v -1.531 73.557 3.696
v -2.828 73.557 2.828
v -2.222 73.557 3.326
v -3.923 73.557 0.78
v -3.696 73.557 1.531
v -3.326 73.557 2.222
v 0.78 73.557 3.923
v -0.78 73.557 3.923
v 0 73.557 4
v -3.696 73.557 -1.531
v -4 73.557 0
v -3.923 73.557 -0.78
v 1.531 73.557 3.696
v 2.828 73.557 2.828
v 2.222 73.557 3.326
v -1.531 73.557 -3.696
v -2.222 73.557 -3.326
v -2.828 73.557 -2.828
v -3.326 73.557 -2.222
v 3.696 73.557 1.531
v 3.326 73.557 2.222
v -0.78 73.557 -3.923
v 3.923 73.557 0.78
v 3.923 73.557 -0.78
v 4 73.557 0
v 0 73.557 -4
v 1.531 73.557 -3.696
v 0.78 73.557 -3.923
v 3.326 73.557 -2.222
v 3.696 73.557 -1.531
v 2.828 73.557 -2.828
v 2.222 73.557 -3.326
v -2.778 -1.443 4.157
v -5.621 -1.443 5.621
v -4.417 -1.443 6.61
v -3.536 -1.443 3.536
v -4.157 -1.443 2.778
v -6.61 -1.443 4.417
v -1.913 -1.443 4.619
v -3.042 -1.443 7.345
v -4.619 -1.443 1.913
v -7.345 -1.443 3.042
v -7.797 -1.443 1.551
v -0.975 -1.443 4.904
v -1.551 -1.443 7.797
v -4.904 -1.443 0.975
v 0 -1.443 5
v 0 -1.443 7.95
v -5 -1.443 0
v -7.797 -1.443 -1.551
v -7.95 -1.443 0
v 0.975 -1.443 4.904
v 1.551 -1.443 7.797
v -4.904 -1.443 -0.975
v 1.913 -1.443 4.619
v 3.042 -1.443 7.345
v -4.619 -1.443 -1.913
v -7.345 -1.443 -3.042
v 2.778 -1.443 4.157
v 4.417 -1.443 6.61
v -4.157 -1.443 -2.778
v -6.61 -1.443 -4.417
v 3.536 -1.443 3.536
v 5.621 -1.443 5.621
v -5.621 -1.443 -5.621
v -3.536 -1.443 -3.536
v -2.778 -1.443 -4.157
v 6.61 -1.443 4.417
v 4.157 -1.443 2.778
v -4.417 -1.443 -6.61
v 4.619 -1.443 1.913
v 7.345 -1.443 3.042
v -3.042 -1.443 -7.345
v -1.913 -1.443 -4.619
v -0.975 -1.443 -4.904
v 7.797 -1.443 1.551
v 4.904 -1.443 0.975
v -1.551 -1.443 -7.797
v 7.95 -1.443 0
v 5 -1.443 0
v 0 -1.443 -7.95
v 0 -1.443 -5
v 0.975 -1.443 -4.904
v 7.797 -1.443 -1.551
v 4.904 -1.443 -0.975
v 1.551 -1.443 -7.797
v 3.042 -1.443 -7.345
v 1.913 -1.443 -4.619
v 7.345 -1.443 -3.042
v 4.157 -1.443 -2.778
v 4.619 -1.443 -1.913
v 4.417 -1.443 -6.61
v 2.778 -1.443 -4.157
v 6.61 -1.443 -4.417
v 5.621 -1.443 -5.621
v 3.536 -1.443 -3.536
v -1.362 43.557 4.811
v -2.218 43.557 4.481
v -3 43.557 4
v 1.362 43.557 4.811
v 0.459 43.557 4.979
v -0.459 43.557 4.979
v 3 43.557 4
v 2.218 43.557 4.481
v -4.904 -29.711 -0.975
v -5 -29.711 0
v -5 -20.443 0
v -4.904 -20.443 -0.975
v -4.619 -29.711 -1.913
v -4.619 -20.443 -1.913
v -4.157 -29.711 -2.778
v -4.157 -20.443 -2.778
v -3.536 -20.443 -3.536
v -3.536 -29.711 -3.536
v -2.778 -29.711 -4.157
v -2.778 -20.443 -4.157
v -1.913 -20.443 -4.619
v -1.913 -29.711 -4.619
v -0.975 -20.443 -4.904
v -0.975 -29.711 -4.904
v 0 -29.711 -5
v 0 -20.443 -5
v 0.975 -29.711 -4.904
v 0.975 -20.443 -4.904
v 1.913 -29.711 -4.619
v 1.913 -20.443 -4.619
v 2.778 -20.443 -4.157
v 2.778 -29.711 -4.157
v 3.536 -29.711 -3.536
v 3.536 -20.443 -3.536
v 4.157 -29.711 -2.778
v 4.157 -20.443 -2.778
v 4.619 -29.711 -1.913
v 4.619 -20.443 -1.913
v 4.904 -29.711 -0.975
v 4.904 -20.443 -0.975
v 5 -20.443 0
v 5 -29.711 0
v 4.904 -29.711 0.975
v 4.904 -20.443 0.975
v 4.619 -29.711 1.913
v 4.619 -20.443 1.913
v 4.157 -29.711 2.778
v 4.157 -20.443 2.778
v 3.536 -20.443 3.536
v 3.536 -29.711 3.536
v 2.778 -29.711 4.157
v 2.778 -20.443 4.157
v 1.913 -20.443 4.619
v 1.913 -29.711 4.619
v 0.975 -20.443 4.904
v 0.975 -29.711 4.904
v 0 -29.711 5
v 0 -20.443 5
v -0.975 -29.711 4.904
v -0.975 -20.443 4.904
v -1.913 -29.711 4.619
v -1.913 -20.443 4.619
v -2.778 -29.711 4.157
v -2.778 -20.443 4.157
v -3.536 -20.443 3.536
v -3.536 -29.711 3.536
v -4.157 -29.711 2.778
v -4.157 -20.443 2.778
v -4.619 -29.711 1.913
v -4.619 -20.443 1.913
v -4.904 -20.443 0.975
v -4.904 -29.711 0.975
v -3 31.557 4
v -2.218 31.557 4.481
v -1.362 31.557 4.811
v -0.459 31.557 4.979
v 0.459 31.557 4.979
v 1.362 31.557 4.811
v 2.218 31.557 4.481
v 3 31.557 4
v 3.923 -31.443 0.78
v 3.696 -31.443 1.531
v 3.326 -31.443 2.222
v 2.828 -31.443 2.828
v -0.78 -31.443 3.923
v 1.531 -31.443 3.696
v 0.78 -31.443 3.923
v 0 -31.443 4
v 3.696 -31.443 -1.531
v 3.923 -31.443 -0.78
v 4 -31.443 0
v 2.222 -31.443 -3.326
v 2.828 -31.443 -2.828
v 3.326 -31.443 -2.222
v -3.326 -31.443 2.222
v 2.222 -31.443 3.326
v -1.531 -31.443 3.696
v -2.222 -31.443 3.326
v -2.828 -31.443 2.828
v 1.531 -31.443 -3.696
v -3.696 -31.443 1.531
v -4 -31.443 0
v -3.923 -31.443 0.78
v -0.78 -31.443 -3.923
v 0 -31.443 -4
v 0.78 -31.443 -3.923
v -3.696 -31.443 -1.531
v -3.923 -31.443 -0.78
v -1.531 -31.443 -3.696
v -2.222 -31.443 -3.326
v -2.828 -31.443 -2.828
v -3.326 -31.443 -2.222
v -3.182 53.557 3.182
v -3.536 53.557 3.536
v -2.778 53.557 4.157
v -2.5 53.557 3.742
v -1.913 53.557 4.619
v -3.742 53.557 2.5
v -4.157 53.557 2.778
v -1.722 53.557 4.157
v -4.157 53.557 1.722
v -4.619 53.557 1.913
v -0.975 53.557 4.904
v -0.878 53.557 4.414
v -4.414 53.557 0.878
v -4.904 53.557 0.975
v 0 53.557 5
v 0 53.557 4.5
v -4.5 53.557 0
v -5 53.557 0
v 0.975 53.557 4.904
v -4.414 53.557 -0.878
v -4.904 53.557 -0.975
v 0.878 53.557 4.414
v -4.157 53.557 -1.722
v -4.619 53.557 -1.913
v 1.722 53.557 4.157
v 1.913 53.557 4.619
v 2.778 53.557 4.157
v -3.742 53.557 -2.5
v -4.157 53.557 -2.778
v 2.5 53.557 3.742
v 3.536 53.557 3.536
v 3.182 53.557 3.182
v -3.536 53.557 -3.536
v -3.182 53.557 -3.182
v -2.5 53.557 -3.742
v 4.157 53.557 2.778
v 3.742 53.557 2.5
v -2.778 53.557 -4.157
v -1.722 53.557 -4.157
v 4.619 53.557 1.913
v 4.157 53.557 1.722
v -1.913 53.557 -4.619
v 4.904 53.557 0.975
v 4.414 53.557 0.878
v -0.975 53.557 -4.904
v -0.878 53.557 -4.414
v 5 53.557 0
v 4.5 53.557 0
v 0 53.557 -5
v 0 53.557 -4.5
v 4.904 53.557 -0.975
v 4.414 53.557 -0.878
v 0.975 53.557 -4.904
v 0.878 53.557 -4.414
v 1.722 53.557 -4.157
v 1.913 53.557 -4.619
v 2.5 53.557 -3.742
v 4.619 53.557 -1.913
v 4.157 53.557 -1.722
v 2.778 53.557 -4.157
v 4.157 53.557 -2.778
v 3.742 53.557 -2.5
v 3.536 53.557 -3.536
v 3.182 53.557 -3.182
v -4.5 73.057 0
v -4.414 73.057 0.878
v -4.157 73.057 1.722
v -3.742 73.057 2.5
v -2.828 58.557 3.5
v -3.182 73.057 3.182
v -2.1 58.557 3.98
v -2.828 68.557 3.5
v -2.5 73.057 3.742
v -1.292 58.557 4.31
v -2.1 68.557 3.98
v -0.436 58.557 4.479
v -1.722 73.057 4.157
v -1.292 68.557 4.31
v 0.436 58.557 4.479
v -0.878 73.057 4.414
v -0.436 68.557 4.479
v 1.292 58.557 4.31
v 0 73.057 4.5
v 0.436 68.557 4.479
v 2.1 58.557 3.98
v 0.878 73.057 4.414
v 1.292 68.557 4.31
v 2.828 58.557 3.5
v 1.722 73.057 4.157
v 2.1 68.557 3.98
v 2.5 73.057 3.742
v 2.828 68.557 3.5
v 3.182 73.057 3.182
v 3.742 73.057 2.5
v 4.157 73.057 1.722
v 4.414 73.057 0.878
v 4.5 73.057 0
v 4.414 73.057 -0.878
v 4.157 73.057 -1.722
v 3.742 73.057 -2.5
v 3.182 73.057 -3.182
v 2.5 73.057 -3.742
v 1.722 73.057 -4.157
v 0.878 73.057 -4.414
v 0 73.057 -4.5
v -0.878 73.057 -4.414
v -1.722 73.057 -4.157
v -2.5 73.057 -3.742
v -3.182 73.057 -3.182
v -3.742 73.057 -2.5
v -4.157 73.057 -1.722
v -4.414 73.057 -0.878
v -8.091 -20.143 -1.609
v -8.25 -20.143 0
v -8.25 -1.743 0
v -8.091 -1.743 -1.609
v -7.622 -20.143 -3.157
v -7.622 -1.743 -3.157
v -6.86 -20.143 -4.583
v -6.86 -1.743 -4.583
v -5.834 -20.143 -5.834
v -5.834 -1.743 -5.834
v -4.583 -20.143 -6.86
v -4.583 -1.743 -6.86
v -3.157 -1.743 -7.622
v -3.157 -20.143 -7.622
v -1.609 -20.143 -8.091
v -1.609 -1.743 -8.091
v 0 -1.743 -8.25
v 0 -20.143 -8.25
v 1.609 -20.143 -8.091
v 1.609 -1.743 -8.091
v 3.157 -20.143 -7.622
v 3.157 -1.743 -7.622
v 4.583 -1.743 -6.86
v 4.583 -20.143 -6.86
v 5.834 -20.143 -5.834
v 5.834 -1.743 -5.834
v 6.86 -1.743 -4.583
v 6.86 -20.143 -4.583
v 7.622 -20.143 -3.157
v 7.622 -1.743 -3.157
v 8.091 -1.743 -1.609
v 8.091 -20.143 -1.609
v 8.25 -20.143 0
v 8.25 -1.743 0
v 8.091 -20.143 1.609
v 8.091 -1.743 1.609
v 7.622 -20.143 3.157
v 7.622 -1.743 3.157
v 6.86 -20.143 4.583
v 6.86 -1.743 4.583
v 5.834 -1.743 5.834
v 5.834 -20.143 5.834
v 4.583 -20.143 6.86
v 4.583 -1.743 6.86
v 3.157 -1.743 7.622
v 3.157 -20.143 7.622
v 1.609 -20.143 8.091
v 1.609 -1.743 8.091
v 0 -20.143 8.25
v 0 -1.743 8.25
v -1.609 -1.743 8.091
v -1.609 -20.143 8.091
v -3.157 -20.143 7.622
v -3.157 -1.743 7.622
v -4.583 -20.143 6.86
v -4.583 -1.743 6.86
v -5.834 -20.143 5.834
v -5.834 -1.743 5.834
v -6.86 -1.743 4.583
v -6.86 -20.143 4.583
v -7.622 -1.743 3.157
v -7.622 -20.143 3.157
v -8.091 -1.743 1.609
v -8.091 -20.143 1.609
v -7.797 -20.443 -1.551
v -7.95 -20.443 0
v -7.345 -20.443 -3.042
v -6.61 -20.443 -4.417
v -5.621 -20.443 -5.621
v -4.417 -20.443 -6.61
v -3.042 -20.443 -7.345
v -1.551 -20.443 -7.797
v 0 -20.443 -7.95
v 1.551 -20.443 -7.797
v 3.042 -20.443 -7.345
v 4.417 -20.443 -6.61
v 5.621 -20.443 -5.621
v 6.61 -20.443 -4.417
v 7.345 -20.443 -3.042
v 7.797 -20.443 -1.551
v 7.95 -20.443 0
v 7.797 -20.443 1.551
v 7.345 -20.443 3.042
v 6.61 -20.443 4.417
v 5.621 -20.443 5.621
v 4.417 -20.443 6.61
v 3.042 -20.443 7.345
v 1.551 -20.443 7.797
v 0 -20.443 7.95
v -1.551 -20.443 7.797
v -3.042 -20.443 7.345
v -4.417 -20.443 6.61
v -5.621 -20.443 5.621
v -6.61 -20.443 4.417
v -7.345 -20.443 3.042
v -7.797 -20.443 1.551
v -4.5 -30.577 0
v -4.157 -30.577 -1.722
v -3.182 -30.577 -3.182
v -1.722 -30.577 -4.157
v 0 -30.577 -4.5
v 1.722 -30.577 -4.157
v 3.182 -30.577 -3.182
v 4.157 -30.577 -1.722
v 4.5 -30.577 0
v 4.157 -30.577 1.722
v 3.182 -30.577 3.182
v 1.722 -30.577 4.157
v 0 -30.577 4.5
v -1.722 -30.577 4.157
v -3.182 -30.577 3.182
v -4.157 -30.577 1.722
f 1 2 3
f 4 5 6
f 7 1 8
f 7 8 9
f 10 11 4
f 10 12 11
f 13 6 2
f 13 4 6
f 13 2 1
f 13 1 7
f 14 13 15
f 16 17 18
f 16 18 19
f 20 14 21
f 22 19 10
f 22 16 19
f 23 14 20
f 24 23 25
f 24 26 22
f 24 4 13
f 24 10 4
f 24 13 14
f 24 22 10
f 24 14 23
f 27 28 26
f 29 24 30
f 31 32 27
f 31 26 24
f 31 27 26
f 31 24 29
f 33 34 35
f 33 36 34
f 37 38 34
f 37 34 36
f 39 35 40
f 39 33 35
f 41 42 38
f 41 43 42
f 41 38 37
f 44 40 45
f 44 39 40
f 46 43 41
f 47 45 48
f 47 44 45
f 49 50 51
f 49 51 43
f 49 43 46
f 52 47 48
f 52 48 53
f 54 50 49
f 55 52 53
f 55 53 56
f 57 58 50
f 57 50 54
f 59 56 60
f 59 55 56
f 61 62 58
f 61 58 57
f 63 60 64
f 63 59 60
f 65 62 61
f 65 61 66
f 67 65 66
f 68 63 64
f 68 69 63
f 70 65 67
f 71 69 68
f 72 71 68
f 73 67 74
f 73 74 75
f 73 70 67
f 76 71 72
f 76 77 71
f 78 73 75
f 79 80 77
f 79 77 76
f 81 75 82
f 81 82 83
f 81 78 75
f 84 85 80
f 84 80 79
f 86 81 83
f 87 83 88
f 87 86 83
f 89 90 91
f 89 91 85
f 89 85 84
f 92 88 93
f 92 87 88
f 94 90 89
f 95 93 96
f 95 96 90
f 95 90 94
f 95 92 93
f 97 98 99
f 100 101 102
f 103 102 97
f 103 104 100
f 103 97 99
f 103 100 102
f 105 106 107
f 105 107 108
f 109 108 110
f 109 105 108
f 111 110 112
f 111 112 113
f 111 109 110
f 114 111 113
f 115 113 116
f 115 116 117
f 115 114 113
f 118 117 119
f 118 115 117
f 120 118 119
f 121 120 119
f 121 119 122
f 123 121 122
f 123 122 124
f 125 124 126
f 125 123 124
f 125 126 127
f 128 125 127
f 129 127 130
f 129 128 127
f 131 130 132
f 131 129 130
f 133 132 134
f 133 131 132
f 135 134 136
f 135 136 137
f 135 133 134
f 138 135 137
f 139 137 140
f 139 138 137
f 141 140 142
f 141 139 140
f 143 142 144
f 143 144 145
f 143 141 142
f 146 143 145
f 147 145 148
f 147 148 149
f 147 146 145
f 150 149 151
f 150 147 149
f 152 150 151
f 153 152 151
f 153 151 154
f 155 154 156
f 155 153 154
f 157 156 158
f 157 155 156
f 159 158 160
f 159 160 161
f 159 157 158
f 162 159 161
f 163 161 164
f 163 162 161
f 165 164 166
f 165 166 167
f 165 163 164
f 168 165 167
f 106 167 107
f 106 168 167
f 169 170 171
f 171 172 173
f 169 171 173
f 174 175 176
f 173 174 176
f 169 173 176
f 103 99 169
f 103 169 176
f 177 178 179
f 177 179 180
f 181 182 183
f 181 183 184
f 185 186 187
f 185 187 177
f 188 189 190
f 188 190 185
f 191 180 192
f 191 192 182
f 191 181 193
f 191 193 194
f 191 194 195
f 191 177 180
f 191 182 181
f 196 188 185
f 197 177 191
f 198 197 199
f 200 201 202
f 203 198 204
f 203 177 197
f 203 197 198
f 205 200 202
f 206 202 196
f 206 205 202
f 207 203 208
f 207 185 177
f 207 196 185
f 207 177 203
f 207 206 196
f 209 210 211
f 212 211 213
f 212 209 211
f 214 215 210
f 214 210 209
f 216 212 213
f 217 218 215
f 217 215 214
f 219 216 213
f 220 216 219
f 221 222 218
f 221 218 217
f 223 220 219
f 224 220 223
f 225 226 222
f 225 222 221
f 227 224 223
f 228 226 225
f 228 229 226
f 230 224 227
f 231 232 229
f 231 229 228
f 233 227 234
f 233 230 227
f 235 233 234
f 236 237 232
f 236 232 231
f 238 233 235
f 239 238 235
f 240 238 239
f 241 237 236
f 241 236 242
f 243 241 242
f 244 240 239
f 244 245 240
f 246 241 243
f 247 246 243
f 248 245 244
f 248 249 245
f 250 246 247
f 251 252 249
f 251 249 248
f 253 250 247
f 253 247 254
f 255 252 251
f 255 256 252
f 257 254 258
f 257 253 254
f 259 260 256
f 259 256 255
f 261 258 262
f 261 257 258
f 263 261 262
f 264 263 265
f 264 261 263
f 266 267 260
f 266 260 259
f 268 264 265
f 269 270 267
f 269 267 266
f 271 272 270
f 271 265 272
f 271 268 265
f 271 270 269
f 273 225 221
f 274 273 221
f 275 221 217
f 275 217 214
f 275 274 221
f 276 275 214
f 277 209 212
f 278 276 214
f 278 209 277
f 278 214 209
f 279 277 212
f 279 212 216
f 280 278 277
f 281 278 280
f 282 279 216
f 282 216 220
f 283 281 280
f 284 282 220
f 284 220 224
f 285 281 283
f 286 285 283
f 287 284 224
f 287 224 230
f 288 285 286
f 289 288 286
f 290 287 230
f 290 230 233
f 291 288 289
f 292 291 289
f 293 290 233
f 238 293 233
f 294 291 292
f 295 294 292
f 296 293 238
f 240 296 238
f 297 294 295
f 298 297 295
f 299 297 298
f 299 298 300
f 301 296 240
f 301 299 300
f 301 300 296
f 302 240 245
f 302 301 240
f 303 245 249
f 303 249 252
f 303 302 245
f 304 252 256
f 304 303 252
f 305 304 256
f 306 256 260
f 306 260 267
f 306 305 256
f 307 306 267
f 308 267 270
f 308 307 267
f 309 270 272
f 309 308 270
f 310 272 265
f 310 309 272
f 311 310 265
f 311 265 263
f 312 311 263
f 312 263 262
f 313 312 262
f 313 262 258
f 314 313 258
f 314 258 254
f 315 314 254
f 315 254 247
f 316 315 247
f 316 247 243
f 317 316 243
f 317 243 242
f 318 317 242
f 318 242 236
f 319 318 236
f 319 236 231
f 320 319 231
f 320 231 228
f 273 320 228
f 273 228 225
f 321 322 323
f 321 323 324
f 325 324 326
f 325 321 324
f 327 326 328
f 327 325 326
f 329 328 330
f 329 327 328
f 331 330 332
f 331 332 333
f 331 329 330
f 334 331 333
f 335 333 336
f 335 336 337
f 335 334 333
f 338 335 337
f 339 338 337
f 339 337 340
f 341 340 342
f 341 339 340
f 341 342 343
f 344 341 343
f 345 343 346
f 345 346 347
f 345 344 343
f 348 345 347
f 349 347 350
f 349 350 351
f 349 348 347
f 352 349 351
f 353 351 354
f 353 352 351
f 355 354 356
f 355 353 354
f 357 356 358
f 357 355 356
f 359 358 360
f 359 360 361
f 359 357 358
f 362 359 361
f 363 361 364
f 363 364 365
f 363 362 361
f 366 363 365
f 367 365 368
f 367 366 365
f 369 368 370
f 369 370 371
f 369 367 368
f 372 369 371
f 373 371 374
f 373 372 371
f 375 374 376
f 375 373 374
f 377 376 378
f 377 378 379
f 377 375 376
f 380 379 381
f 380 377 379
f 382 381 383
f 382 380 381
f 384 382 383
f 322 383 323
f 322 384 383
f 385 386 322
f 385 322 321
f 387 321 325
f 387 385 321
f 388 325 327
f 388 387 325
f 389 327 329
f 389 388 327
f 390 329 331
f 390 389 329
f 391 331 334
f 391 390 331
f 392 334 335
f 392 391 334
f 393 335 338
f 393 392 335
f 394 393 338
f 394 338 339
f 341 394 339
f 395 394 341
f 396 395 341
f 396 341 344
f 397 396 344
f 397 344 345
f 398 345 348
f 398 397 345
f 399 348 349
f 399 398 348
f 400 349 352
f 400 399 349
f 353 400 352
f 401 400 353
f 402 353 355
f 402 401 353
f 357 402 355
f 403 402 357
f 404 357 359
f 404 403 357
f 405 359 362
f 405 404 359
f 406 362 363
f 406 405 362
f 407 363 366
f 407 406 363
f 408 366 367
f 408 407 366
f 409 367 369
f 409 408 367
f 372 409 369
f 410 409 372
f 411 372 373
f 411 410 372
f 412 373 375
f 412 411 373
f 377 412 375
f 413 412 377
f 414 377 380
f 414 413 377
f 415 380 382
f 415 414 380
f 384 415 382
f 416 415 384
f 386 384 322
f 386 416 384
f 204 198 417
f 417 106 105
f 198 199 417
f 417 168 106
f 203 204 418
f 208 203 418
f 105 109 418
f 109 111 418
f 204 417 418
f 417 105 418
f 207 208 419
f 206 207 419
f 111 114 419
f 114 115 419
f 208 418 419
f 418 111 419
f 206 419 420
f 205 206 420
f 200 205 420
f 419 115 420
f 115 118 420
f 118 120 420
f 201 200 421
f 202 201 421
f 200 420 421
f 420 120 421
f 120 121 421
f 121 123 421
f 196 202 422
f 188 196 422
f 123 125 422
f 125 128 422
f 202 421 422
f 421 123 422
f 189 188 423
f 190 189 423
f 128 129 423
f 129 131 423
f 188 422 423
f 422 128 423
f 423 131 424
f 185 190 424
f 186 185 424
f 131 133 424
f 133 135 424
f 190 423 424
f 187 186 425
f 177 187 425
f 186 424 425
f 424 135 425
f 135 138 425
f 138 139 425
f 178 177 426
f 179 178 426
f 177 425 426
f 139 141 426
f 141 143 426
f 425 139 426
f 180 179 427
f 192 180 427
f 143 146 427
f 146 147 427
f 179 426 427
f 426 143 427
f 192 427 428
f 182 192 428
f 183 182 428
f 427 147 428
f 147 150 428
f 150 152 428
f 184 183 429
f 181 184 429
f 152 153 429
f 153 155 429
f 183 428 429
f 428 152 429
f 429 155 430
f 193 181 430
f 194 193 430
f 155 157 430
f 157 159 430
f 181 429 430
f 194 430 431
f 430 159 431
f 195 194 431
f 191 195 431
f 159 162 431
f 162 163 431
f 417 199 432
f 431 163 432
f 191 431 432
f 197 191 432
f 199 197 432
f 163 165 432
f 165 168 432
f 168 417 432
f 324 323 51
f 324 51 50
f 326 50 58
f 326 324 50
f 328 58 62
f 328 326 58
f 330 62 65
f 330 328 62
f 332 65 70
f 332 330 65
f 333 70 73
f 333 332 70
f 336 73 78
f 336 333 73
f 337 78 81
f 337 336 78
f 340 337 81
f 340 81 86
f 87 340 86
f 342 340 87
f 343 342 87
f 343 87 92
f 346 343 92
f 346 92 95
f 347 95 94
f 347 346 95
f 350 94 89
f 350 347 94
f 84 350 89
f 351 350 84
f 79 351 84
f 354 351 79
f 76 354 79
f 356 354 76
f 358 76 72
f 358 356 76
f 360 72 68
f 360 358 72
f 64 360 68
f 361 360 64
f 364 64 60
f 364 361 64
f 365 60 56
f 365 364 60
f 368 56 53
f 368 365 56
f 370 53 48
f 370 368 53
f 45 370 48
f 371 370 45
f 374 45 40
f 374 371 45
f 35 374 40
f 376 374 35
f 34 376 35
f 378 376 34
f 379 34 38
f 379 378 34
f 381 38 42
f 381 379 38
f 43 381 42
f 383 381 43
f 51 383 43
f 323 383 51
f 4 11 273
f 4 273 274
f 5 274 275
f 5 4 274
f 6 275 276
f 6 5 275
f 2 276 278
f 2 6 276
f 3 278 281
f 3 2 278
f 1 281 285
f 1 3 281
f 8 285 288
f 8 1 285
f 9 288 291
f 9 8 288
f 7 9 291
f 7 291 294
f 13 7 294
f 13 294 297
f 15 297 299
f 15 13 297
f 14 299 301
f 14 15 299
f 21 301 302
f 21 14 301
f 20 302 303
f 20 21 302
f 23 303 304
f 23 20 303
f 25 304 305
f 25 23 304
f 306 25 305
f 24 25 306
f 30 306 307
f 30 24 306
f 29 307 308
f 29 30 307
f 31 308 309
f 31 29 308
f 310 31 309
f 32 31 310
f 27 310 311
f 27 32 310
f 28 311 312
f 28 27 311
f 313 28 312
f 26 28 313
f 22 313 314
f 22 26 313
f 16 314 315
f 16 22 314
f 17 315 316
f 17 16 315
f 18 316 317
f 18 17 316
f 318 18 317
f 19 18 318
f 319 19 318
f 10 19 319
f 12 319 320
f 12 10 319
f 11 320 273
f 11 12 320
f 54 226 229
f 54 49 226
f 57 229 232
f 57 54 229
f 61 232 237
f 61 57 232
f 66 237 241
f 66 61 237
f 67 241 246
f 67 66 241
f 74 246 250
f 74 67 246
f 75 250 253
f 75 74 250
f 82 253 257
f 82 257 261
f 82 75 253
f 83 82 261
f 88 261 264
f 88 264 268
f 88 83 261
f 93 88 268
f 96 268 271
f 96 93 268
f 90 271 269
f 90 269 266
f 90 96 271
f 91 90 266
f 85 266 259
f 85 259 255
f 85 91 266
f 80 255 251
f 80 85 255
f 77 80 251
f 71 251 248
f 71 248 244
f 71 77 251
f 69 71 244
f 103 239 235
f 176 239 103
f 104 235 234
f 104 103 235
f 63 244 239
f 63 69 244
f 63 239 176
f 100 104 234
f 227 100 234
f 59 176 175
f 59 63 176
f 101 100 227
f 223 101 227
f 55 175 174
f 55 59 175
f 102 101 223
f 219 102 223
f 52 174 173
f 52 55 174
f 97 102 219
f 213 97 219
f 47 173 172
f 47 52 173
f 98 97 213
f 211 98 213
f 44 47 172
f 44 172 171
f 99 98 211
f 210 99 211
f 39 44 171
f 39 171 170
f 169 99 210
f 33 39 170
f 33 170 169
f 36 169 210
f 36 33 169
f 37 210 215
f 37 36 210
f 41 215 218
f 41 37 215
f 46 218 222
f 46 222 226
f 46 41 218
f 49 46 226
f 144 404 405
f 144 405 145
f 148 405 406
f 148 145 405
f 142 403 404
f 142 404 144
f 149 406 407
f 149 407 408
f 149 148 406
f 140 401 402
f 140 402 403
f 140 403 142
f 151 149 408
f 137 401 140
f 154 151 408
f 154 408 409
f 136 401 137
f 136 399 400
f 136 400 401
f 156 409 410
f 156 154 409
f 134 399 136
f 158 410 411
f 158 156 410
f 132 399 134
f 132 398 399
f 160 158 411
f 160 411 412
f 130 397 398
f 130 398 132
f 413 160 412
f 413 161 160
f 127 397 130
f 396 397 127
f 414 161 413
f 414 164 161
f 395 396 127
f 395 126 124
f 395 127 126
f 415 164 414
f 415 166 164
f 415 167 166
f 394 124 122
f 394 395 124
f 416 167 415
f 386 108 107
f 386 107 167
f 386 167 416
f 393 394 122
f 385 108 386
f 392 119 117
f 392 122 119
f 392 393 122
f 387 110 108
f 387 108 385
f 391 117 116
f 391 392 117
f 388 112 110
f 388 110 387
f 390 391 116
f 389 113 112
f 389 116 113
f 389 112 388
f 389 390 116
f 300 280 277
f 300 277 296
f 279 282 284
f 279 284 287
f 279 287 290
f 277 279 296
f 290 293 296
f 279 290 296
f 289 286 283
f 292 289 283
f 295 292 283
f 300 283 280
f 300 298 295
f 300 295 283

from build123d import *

# Parameters (mm, degrees)
CHANFREIN1_SIZE         = 1
CHANFREIN1_SIZE2        = 1.732050808
ESQUISSE3_W             = 48.532957324
ESQUISSE3_H             = 12
ENL_V_MAT_EXTRU_1_DEPTH = 1
ESQUISSE4_OUTSIDE_W     = 40.012
ESQUISSE4_OUTSIDE_H     = 40.012
ESQUISSE4_OUTSIDE_R     = 4.5
ENL_V_MAT_EXTRU_2_DEPTH = 20
ESQUISSE5_W             = 37.366082186
ESQUISSE5_H             = 10
ENL_V_MAT_EXTRU_3_DEPTH = 1.5
CHANFREIN2_SIZE         = 0.5
CHANFREIN3_SIZE         = 0.3


with BuildPart() as part:
    # Esquisse1 → Révolution1 (revolve)
    with BuildSketch(Plane.XY, mode=Mode.PRIVATE) as r_volution1_sk:
        Polygon((5, 73.557112482), (5, -1.442887518), (8.25, -1.442887518), (8.25, -20.442887518), (5, -20.442887518), (5, -31.442887518), (0, -31.442887518), (0, 73.557112482), align=None)
    revolve(r_volution1_sk.sketch.rotate(Axis((0, 73.557112482, 0), (0, -1, 0)), 180), axis=Axis((0, 73.557112482, 0), (0, -1, 0)))  # turned: the seam where the file's is

    # Chanfrein1
    chanfrein1_edges = [part.edges().sort_by_distance(p)[0] for p in [
        (5, -31.442887518, 0),
    ]]
    chanfrein1_side = [part.faces().sort_by_distance(p)[0] for p in [
        (0, -31.442887518, 0),
    ]]
    chamfer(chanfrein1_edges, length=CHANFREIN1_SIZE, length2=CHANFREIN1_SIZE2, reference=chanfrein1_side[0])

    # Esquisse3 → Enlèv. mat.-Extru.1 (cut)
    with BuildSketch(Plane.XY.offset(5)):
        with Locations((0, 37.557112482)):
            Rectangle(ESQUISSE3_W, ESQUISSE3_H)
    extrude(amount=-ENL_V_MAT_EXTRU_1_DEPTH, mode=Mode.SUBTRACT)

    # Esquisse4 outside → Enlèv. mat.-Extru.2 (cut)
    with BuildSketch(Plane(origin=(0, 73.557112482, 0), x_dir=(1, 0, 0), z_dir=(0, 1, 0))):
        Rectangle(ESQUISSE4_OUTSIDE_W, ESQUISSE4_OUTSIDE_H)
        with Locations(Location((0, 0, 0), (0, 0, 180))):  # turned: the seam where the file's is
            Circle(ESQUISSE4_OUTSIDE_R, mode=Mode.SUBTRACT)
    extrude(amount=-ENL_V_MAT_EXTRU_2_DEPTH, mode=Mode.SUBTRACT)

    # Esquisse5 → Enlèv. mat.-Extru.3 (cut)
    with BuildSketch(Plane.XY.offset(5)):
        with Locations((0, 63.557112482)):
            Rectangle(ESQUISSE5_W, ESQUISSE5_H)
    extrude(amount=-ENL_V_MAT_EXTRU_3_DEPTH, mode=Mode.SUBTRACT)

    # Chanfrein2
    chanfrein2_edges = [part.edges().sort_by_distance(p)[0] for p in [
        (4.5, 73.557112482, 0),
    ]]
    chamfer(chanfrein2_edges, length=CHANFREIN2_SIZE)

    # Chanfrein3
    chanfrein3_edges = [part.edges().sort_by_distance(p)[0] for p in [
        (8.25, -1.442887518, 0),
        (8.25, -20.442887518, 0),
    ]]
    chamfer(chanfrein3_edges, length=CHANFREIN3_SIZE)


solid = part.part
